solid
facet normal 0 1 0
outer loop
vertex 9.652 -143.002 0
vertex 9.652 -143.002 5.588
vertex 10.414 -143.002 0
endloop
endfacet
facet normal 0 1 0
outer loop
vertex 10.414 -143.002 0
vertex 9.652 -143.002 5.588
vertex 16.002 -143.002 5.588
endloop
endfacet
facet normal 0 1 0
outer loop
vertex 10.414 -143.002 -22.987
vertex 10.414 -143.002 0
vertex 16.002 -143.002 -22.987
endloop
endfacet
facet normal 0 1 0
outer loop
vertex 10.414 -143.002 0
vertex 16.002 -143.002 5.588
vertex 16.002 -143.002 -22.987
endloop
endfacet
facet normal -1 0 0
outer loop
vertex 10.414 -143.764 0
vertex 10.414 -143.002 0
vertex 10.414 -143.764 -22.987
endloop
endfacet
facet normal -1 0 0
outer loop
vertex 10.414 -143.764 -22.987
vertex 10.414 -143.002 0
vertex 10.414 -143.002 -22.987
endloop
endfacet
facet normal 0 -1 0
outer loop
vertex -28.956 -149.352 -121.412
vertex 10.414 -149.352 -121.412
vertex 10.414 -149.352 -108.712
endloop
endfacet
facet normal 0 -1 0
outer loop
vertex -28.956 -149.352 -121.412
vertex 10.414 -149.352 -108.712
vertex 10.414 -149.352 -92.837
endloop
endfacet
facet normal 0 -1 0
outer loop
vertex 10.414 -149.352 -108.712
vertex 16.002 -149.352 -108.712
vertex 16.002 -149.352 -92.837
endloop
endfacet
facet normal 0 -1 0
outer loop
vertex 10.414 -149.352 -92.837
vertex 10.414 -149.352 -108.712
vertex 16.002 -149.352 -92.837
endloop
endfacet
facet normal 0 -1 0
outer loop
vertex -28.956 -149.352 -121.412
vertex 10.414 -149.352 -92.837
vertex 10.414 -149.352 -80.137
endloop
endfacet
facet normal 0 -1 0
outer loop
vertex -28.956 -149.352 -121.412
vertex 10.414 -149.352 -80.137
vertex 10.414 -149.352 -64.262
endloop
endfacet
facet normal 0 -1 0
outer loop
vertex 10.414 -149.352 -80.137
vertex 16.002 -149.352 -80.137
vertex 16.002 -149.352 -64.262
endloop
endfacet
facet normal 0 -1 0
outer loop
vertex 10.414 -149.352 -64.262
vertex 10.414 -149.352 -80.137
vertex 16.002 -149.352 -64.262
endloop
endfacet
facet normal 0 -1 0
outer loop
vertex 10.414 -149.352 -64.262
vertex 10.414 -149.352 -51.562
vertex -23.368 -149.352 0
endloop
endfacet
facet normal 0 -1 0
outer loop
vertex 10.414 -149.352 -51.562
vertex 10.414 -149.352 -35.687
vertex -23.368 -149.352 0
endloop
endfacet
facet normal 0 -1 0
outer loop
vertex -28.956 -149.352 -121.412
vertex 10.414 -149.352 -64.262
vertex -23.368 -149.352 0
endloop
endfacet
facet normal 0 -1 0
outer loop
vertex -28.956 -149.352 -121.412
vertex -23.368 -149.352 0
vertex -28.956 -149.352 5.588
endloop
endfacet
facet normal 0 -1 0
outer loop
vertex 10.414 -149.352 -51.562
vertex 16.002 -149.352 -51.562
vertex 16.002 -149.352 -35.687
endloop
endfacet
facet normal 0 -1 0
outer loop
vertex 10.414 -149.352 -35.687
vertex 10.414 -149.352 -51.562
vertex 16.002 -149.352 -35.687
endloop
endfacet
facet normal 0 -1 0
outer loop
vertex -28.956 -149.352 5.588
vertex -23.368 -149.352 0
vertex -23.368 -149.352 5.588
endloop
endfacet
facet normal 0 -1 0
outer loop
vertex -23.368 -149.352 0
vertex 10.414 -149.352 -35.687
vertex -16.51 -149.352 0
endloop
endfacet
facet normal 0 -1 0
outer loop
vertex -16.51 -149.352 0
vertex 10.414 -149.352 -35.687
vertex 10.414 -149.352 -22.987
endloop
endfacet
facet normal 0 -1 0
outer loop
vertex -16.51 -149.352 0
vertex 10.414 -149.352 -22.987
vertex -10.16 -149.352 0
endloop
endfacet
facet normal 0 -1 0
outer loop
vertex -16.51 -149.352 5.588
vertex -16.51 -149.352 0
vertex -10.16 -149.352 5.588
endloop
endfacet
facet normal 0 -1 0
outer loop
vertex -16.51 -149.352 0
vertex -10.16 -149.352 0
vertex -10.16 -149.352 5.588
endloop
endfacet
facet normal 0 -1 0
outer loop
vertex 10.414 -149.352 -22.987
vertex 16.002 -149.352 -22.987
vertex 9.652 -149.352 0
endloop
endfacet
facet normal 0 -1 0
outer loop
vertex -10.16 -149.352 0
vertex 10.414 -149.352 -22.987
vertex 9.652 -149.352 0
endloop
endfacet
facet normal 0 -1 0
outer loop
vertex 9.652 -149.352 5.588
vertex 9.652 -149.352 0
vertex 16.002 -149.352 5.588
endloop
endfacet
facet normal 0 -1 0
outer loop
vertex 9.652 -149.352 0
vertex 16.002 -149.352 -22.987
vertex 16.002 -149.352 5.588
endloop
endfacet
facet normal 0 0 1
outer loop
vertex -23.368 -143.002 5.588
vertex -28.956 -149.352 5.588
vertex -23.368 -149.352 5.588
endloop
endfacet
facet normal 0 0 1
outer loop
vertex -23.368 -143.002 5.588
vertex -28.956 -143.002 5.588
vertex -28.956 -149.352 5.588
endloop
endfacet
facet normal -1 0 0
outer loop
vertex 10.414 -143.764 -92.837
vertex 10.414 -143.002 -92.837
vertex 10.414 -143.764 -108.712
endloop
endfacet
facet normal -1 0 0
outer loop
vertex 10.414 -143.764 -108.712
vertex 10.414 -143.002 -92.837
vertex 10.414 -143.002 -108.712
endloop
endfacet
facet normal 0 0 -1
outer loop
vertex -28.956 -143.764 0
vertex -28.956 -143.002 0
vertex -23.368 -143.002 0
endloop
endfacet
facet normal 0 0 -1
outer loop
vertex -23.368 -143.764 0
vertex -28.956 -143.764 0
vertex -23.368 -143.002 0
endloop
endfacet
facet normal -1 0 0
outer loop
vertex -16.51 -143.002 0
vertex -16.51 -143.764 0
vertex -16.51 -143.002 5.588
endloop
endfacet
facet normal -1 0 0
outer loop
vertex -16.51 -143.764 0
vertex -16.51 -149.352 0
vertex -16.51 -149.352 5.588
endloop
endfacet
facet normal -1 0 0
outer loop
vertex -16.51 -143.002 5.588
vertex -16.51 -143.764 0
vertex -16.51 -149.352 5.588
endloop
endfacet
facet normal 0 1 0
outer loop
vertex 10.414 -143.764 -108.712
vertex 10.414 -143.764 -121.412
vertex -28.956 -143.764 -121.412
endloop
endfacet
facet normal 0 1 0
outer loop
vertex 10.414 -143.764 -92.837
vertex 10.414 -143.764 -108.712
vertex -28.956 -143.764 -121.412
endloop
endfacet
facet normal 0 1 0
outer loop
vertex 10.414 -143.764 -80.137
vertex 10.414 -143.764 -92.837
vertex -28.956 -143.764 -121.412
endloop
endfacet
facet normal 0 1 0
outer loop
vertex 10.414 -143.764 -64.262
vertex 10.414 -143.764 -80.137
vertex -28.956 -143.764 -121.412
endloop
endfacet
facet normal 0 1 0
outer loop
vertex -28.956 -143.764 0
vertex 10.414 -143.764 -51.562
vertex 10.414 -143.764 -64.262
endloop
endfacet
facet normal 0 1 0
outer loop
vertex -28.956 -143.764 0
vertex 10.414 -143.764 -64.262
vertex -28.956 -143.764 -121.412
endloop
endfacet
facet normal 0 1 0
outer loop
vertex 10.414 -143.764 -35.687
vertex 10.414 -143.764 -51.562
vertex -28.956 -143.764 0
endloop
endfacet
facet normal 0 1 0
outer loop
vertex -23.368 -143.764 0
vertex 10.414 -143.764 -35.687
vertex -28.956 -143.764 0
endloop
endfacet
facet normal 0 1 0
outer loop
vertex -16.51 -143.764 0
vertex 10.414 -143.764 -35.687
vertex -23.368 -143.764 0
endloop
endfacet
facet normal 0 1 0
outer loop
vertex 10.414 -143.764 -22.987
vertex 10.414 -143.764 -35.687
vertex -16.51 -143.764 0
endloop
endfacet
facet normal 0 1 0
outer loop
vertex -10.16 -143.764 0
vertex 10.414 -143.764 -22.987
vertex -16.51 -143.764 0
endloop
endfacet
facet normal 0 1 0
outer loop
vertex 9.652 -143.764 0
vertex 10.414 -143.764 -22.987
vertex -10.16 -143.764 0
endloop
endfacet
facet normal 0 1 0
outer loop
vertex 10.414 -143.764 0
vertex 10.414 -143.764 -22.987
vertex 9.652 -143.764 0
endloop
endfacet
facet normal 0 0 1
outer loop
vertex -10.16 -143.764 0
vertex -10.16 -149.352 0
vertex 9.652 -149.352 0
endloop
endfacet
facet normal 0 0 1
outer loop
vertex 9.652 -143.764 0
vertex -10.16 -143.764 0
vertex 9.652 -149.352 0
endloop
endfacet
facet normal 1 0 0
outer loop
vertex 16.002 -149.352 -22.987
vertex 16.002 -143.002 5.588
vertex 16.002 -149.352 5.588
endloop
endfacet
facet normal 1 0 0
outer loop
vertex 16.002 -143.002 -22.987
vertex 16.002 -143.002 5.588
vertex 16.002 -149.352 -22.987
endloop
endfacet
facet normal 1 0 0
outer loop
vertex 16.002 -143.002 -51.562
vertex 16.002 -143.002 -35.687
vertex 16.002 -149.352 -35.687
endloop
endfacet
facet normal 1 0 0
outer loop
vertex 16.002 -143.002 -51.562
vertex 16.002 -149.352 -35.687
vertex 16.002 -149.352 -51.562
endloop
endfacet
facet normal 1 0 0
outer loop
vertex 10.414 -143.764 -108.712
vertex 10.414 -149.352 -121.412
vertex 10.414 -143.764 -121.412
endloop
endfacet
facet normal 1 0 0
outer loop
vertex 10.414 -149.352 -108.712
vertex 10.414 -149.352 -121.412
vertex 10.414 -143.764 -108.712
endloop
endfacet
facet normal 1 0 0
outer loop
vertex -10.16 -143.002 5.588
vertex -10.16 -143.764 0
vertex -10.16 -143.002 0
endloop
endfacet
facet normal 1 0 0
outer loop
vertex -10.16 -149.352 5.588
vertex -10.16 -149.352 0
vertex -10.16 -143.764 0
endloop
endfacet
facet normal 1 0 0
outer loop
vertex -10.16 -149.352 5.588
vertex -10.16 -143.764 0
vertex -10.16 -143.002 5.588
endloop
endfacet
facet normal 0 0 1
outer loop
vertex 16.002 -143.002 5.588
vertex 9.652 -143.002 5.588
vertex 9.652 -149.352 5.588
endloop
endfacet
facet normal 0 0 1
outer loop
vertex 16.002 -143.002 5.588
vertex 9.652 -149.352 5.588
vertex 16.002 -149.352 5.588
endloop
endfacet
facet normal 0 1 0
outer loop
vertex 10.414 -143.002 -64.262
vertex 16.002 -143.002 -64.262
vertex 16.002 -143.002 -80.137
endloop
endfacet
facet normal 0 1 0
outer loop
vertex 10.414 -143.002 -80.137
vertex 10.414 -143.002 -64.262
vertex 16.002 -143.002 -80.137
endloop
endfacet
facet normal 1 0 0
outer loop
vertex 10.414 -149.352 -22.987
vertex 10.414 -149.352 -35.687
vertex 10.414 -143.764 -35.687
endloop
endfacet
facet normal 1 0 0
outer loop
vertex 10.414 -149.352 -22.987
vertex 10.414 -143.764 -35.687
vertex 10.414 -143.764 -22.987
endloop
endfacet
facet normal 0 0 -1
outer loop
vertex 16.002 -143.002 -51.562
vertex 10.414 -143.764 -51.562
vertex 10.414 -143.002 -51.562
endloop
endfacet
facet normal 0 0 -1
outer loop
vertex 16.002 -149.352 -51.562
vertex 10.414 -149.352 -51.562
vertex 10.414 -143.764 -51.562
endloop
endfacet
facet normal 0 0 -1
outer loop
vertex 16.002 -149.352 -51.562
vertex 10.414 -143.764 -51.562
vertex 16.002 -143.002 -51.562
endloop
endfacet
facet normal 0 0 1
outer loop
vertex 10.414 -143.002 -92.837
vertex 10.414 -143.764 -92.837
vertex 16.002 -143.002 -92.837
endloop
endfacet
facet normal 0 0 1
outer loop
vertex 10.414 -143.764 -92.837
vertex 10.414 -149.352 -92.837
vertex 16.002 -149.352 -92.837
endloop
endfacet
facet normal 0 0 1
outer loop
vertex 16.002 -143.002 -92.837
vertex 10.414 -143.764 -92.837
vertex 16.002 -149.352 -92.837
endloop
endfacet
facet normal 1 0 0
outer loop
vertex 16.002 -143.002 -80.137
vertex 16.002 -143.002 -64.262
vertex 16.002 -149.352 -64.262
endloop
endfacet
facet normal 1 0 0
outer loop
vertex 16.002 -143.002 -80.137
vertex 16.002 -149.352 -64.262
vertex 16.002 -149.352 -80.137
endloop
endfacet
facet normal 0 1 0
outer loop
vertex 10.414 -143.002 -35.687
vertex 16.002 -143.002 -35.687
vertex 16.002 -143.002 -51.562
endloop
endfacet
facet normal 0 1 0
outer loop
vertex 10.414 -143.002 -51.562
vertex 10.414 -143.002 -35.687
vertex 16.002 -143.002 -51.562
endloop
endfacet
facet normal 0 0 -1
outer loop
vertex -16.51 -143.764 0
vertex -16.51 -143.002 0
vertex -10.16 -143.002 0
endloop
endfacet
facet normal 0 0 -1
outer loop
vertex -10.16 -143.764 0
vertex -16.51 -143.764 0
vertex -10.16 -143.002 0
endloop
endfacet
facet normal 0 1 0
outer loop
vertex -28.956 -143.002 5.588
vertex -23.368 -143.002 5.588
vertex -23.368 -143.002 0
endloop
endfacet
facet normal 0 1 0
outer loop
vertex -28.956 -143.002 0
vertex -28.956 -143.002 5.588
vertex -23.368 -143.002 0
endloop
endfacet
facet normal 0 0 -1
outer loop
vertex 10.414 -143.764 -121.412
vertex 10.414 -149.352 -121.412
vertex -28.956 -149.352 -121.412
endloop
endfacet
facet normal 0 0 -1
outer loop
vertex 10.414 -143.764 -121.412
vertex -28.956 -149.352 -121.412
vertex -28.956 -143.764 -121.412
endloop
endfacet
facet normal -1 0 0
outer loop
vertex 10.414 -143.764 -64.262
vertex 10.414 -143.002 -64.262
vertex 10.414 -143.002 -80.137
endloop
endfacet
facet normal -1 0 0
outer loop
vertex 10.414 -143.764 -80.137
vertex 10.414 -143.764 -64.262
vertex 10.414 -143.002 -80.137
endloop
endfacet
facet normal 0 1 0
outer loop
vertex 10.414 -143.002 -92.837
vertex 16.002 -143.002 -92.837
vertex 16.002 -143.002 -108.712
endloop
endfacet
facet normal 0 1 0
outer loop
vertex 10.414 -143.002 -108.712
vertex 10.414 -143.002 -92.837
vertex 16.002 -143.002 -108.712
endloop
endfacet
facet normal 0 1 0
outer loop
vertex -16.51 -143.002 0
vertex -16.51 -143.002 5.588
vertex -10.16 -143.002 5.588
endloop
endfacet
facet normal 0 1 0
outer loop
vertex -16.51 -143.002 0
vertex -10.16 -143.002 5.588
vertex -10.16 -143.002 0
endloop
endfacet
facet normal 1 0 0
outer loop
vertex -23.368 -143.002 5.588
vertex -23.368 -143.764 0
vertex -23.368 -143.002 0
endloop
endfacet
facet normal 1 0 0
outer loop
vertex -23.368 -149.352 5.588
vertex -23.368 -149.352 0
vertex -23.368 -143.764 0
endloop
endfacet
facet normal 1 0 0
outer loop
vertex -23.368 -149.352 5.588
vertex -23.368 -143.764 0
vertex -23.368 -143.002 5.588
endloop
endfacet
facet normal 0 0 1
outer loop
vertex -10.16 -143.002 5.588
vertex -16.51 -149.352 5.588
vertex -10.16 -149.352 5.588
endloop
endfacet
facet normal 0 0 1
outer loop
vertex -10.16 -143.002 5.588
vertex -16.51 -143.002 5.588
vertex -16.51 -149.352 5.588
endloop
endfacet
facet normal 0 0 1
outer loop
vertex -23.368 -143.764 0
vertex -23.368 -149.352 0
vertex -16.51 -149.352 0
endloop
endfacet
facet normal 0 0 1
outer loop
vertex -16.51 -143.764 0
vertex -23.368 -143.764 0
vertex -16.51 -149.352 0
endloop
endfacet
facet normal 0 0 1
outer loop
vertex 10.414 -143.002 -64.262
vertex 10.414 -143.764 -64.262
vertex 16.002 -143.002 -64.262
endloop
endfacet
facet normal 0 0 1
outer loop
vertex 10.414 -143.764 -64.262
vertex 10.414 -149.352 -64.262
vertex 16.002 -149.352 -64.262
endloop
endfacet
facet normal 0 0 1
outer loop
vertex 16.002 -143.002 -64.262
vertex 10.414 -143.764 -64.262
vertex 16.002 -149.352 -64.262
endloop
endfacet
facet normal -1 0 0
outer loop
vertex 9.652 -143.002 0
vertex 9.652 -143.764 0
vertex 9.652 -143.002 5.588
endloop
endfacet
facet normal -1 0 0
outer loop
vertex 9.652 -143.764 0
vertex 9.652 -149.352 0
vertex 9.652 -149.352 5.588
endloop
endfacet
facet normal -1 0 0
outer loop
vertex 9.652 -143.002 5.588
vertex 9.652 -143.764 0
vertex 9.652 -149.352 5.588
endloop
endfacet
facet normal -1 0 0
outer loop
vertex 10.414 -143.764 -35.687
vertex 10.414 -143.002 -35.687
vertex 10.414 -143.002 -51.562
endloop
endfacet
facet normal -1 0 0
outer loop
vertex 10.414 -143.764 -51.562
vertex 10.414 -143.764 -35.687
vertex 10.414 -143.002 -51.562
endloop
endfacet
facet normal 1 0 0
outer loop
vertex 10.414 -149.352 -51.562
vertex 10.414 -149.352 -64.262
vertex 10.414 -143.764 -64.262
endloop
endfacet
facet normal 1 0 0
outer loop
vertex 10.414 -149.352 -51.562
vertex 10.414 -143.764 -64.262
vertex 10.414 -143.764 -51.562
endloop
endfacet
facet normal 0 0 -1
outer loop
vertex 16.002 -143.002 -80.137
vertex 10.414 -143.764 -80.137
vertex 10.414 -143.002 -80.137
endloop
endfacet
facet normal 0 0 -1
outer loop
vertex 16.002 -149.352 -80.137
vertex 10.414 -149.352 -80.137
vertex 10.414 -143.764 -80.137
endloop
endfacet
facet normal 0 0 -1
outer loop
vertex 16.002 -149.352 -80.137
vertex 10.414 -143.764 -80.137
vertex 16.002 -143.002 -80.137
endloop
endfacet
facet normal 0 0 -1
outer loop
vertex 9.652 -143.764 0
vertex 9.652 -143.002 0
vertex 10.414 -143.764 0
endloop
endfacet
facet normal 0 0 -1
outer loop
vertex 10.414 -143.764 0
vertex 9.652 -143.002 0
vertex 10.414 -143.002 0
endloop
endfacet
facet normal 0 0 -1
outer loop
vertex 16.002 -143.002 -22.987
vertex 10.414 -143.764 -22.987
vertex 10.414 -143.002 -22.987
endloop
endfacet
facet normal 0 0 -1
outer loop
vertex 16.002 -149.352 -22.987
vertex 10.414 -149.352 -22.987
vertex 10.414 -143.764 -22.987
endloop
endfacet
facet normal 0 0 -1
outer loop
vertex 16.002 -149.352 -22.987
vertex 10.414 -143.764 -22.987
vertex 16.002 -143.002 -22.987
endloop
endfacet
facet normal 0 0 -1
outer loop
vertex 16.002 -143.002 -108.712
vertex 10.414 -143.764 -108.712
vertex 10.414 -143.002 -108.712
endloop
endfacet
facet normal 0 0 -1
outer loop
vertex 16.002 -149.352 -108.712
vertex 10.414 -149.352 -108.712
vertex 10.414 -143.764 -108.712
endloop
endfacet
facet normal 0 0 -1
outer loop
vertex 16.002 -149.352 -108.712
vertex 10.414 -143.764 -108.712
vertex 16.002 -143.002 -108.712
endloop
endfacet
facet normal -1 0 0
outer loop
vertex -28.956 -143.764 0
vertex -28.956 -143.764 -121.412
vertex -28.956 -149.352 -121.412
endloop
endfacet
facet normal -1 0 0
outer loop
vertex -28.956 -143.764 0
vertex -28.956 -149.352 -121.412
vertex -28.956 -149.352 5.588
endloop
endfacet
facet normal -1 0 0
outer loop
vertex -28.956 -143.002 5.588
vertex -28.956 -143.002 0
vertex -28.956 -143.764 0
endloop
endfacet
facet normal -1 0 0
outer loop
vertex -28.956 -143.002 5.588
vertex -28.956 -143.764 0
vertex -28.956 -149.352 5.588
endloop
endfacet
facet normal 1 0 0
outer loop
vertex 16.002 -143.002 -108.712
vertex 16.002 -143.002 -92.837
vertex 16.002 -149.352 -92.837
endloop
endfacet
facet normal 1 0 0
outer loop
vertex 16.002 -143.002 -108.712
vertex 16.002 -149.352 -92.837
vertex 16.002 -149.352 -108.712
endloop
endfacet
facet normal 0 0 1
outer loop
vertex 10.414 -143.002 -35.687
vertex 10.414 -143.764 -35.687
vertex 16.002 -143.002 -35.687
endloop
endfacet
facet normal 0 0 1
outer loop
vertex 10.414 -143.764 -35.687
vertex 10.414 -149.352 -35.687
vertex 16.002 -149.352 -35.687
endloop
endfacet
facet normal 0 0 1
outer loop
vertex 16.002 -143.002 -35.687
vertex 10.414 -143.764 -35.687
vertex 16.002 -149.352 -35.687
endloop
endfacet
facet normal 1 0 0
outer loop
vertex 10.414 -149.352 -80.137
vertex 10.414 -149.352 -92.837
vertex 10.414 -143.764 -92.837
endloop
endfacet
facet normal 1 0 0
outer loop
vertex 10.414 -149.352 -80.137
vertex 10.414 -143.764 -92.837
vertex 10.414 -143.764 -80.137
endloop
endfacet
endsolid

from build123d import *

# Parameters (mm, degrees)
SKETCH1_W           = 44.958
SKETCH1_H           = 304.8
BOSS_EXTRUDE1_DEPTH = 5.588
SKETCH2_W           = 5.588
SKETCH2_H           = 101.6
BOSS_EXTRUDE2_DEPTH = 5.588
SKETCH3_W           = 121.412
SKETCH3_H           = 5.588
BOSS_EXTRUDE3_DEPTH = 39.37
SKETCH7_W           = 332.610738736
SKETCH7_H           = 323.725005723
CUT_EXTRUDE1_DEPTH  = 45.958
SKETCH4_W           = 5.588
SKETCH4_H           = 12.7
CUT_EXTRUDE2_DEPTH  = 6.35
SKETCH8_W           = 6.858
SKETCH8_H           = 5.588
SKETCH8_W_2         = 19.812
CUT_EXTRUDE4_DEPTH  = 7.35


with BuildPart() as part:
    # Sketch1 → Boss-Extrude1 (new body)
    with BuildSketch(Plane.XY):
        with Locations((-6.477, 3.048)):
            Rectangle(SKETCH1_W, SKETCH1_H)
        with BuildLine():
            Line((-3.302, 133.858), (-3.302, -143.002))
            Line((-3.302, -143.002), (3.302, -143.002))
            Line((3.302, -143.002), (3.302, 143.002))
            Line((3.302, 143.002), (-16.256, 143.002))
            Line((-16.256, 143.002), (-16.256, 136.398))
            Line((-16.256, 136.398), (-5.842, 136.398))
            ThreePointArc((-5.842, 136.398), (-4.045948776, 135.654051224), (-3.302, 133.858))
        make_face(mode=Mode.SUBTRACT)
    extrude(amount=BOSS_EXTRUDE1_DEPTH)

    # Sketch2 → Boss-Extrude2 (add)
    with BuildSketch(Plane(origin=(16.002, 0, 0), x_dir=(0, 0, -1), z_dir=(1, 0, 0))):
        Polygon((121.412, -60.452), (121.412, -47.752), (0, -47.752), (0, -149.352), (121.412, -149.352), (121.412, -136.652), (127, -136.652), (127, -119.718666667), (121.412, -119.718666667), (121.412, -107.018666667), (127, -107.018666667), (127, -90.085333333), (121.412, -90.085333333), (121.412, -77.385333333), (127, -77.385333333), (127, -60.452), align=None)
        with BuildLine():
            ThreePointArc((11.4, -116.592), (9.9, -118.092), (8.4, -116.592))
            Line((8.4, -116.592), (8.4, -111.512))
            ThreePointArc((8.4, -111.512), (9.9, -110.012), (11.4, -111.512))
            Line((11.4, -111.512), (11.4, -116.592))
        make_face(mode=Mode.SUBTRACT)
        with BuildLine():
            Line((42.4, -111.512), (42.4, -116.592))
            ThreePointArc((42.4, -116.592), (40.9, -118.092), (39.4, -116.592))
            Line((39.4, -116.592), (39.4, -111.512))
            ThreePointArc((39.4, -111.512), (40.9, -110.012), (42.4, -111.512))
        make_face(mode=Mode.SUBTRACT)
        with BuildLine():
            ThreePointArc((36.4, -101.092), (25.4, -112.092), (14.4, -101.092))
            Line((14.4, -101.092), (14.4, -96.012))
            ThreePointArc((14.4, -96.012), (25.4, -85.012), (36.4, -96.012))
            Line((36.4, -96.012), (36.4, -101.092))
        make_face(mode=Mode.SUBTRACT)
        with BuildLine():
            ThreePointArc((11.4, -85.592), (9.9, -87.092), (8.4, -85.592))
            Line((8.4, -85.592), (8.4, -80.512))
            ThreePointArc((8.4, -80.512), (9.9, -79.012), (11.4, -80.512))
            Line((11.4, -80.512), (11.4, -85.592))
        make_face(mode=Mode.SUBTRACT)
        with BuildLine():
            ThreePointArc((42.4, -85.592), (40.9, -87.092), (39.4, -85.592))
            Line((39.4, -85.592), (39.4, -80.512))
            ThreePointArc((39.4, -80.512), (40.9, -79.012), (42.4, -80.512))
            Line((42.4, -80.512), (42.4, -85.592))
        make_face(mode=Mode.SUBTRACT)
        with Locations((-2.794, -98.552)):
            Rectangle(SKETCH2_W, SKETCH2_H)
    extrude(amount=-BOSS_EXTRUDE2_DEPTH)

    # Sketch3 → Boss-Extrude3 (add)
    with BuildSketch(Plane.ZY.offset(-10.414)):
        with Locations((-60.706, -146.558)):
            Rectangle(SKETCH3_W, SKETCH3_H)
    extrude(amount=BOSS_EXTRUDE3_DEPTH)

    # Sketch7 → Cut-Extrude1 (cut, through all)
    with BuildSketch(Plane(origin=(16.002, 0, 0), x_dir=(0, 0, -1), z_dir=(1, 0, 0))):
        with Locations((160.717369368, 18.860502861)):
            Rectangle(SKETCH7_W, SKETCH7_H)
    extrude(amount=-CUT_EXTRUDE1_DEPTH, mode=Mode.SUBTRACT)

    # Sketch4 → Cut-Extrude2 (cut)
    with BuildSketch(Plane.XZ.offset(149.352)):
        with Locations((13.208, -29.337)):
            Rectangle(SKETCH4_W, SKETCH4_H)
        with Locations((13.208, -57.912)):
            Rectangle(SKETCH4_W, SKETCH4_H)
        with Locations((13.208, -86.487)):
            Rectangle(SKETCH4_W, SKETCH4_H)
        with Locations((13.208, -115.062)):
            Rectangle(SKETCH4_W, SKETCH4_H)
    extrude(amount=-CUT_EXTRUDE2_DEPTH, mode=Mode.SUBTRACT)

    # Sketch8 → Cut-Extrude4 (cut, through all)
    with BuildSketch(Plane.XZ.offset(149.352)):
        with Locations((-19.939, 2.794)):
            Rectangle(SKETCH8_W, SKETCH8_H)
        with Locations((-0.254, 2.794)):
            Rectangle(SKETCH8_W_2, SKETCH8_H)
    extrude(amount=-CUT_EXTRUDE4_DEPTH, mode=Mode.SUBTRACT)


solid = part.part
